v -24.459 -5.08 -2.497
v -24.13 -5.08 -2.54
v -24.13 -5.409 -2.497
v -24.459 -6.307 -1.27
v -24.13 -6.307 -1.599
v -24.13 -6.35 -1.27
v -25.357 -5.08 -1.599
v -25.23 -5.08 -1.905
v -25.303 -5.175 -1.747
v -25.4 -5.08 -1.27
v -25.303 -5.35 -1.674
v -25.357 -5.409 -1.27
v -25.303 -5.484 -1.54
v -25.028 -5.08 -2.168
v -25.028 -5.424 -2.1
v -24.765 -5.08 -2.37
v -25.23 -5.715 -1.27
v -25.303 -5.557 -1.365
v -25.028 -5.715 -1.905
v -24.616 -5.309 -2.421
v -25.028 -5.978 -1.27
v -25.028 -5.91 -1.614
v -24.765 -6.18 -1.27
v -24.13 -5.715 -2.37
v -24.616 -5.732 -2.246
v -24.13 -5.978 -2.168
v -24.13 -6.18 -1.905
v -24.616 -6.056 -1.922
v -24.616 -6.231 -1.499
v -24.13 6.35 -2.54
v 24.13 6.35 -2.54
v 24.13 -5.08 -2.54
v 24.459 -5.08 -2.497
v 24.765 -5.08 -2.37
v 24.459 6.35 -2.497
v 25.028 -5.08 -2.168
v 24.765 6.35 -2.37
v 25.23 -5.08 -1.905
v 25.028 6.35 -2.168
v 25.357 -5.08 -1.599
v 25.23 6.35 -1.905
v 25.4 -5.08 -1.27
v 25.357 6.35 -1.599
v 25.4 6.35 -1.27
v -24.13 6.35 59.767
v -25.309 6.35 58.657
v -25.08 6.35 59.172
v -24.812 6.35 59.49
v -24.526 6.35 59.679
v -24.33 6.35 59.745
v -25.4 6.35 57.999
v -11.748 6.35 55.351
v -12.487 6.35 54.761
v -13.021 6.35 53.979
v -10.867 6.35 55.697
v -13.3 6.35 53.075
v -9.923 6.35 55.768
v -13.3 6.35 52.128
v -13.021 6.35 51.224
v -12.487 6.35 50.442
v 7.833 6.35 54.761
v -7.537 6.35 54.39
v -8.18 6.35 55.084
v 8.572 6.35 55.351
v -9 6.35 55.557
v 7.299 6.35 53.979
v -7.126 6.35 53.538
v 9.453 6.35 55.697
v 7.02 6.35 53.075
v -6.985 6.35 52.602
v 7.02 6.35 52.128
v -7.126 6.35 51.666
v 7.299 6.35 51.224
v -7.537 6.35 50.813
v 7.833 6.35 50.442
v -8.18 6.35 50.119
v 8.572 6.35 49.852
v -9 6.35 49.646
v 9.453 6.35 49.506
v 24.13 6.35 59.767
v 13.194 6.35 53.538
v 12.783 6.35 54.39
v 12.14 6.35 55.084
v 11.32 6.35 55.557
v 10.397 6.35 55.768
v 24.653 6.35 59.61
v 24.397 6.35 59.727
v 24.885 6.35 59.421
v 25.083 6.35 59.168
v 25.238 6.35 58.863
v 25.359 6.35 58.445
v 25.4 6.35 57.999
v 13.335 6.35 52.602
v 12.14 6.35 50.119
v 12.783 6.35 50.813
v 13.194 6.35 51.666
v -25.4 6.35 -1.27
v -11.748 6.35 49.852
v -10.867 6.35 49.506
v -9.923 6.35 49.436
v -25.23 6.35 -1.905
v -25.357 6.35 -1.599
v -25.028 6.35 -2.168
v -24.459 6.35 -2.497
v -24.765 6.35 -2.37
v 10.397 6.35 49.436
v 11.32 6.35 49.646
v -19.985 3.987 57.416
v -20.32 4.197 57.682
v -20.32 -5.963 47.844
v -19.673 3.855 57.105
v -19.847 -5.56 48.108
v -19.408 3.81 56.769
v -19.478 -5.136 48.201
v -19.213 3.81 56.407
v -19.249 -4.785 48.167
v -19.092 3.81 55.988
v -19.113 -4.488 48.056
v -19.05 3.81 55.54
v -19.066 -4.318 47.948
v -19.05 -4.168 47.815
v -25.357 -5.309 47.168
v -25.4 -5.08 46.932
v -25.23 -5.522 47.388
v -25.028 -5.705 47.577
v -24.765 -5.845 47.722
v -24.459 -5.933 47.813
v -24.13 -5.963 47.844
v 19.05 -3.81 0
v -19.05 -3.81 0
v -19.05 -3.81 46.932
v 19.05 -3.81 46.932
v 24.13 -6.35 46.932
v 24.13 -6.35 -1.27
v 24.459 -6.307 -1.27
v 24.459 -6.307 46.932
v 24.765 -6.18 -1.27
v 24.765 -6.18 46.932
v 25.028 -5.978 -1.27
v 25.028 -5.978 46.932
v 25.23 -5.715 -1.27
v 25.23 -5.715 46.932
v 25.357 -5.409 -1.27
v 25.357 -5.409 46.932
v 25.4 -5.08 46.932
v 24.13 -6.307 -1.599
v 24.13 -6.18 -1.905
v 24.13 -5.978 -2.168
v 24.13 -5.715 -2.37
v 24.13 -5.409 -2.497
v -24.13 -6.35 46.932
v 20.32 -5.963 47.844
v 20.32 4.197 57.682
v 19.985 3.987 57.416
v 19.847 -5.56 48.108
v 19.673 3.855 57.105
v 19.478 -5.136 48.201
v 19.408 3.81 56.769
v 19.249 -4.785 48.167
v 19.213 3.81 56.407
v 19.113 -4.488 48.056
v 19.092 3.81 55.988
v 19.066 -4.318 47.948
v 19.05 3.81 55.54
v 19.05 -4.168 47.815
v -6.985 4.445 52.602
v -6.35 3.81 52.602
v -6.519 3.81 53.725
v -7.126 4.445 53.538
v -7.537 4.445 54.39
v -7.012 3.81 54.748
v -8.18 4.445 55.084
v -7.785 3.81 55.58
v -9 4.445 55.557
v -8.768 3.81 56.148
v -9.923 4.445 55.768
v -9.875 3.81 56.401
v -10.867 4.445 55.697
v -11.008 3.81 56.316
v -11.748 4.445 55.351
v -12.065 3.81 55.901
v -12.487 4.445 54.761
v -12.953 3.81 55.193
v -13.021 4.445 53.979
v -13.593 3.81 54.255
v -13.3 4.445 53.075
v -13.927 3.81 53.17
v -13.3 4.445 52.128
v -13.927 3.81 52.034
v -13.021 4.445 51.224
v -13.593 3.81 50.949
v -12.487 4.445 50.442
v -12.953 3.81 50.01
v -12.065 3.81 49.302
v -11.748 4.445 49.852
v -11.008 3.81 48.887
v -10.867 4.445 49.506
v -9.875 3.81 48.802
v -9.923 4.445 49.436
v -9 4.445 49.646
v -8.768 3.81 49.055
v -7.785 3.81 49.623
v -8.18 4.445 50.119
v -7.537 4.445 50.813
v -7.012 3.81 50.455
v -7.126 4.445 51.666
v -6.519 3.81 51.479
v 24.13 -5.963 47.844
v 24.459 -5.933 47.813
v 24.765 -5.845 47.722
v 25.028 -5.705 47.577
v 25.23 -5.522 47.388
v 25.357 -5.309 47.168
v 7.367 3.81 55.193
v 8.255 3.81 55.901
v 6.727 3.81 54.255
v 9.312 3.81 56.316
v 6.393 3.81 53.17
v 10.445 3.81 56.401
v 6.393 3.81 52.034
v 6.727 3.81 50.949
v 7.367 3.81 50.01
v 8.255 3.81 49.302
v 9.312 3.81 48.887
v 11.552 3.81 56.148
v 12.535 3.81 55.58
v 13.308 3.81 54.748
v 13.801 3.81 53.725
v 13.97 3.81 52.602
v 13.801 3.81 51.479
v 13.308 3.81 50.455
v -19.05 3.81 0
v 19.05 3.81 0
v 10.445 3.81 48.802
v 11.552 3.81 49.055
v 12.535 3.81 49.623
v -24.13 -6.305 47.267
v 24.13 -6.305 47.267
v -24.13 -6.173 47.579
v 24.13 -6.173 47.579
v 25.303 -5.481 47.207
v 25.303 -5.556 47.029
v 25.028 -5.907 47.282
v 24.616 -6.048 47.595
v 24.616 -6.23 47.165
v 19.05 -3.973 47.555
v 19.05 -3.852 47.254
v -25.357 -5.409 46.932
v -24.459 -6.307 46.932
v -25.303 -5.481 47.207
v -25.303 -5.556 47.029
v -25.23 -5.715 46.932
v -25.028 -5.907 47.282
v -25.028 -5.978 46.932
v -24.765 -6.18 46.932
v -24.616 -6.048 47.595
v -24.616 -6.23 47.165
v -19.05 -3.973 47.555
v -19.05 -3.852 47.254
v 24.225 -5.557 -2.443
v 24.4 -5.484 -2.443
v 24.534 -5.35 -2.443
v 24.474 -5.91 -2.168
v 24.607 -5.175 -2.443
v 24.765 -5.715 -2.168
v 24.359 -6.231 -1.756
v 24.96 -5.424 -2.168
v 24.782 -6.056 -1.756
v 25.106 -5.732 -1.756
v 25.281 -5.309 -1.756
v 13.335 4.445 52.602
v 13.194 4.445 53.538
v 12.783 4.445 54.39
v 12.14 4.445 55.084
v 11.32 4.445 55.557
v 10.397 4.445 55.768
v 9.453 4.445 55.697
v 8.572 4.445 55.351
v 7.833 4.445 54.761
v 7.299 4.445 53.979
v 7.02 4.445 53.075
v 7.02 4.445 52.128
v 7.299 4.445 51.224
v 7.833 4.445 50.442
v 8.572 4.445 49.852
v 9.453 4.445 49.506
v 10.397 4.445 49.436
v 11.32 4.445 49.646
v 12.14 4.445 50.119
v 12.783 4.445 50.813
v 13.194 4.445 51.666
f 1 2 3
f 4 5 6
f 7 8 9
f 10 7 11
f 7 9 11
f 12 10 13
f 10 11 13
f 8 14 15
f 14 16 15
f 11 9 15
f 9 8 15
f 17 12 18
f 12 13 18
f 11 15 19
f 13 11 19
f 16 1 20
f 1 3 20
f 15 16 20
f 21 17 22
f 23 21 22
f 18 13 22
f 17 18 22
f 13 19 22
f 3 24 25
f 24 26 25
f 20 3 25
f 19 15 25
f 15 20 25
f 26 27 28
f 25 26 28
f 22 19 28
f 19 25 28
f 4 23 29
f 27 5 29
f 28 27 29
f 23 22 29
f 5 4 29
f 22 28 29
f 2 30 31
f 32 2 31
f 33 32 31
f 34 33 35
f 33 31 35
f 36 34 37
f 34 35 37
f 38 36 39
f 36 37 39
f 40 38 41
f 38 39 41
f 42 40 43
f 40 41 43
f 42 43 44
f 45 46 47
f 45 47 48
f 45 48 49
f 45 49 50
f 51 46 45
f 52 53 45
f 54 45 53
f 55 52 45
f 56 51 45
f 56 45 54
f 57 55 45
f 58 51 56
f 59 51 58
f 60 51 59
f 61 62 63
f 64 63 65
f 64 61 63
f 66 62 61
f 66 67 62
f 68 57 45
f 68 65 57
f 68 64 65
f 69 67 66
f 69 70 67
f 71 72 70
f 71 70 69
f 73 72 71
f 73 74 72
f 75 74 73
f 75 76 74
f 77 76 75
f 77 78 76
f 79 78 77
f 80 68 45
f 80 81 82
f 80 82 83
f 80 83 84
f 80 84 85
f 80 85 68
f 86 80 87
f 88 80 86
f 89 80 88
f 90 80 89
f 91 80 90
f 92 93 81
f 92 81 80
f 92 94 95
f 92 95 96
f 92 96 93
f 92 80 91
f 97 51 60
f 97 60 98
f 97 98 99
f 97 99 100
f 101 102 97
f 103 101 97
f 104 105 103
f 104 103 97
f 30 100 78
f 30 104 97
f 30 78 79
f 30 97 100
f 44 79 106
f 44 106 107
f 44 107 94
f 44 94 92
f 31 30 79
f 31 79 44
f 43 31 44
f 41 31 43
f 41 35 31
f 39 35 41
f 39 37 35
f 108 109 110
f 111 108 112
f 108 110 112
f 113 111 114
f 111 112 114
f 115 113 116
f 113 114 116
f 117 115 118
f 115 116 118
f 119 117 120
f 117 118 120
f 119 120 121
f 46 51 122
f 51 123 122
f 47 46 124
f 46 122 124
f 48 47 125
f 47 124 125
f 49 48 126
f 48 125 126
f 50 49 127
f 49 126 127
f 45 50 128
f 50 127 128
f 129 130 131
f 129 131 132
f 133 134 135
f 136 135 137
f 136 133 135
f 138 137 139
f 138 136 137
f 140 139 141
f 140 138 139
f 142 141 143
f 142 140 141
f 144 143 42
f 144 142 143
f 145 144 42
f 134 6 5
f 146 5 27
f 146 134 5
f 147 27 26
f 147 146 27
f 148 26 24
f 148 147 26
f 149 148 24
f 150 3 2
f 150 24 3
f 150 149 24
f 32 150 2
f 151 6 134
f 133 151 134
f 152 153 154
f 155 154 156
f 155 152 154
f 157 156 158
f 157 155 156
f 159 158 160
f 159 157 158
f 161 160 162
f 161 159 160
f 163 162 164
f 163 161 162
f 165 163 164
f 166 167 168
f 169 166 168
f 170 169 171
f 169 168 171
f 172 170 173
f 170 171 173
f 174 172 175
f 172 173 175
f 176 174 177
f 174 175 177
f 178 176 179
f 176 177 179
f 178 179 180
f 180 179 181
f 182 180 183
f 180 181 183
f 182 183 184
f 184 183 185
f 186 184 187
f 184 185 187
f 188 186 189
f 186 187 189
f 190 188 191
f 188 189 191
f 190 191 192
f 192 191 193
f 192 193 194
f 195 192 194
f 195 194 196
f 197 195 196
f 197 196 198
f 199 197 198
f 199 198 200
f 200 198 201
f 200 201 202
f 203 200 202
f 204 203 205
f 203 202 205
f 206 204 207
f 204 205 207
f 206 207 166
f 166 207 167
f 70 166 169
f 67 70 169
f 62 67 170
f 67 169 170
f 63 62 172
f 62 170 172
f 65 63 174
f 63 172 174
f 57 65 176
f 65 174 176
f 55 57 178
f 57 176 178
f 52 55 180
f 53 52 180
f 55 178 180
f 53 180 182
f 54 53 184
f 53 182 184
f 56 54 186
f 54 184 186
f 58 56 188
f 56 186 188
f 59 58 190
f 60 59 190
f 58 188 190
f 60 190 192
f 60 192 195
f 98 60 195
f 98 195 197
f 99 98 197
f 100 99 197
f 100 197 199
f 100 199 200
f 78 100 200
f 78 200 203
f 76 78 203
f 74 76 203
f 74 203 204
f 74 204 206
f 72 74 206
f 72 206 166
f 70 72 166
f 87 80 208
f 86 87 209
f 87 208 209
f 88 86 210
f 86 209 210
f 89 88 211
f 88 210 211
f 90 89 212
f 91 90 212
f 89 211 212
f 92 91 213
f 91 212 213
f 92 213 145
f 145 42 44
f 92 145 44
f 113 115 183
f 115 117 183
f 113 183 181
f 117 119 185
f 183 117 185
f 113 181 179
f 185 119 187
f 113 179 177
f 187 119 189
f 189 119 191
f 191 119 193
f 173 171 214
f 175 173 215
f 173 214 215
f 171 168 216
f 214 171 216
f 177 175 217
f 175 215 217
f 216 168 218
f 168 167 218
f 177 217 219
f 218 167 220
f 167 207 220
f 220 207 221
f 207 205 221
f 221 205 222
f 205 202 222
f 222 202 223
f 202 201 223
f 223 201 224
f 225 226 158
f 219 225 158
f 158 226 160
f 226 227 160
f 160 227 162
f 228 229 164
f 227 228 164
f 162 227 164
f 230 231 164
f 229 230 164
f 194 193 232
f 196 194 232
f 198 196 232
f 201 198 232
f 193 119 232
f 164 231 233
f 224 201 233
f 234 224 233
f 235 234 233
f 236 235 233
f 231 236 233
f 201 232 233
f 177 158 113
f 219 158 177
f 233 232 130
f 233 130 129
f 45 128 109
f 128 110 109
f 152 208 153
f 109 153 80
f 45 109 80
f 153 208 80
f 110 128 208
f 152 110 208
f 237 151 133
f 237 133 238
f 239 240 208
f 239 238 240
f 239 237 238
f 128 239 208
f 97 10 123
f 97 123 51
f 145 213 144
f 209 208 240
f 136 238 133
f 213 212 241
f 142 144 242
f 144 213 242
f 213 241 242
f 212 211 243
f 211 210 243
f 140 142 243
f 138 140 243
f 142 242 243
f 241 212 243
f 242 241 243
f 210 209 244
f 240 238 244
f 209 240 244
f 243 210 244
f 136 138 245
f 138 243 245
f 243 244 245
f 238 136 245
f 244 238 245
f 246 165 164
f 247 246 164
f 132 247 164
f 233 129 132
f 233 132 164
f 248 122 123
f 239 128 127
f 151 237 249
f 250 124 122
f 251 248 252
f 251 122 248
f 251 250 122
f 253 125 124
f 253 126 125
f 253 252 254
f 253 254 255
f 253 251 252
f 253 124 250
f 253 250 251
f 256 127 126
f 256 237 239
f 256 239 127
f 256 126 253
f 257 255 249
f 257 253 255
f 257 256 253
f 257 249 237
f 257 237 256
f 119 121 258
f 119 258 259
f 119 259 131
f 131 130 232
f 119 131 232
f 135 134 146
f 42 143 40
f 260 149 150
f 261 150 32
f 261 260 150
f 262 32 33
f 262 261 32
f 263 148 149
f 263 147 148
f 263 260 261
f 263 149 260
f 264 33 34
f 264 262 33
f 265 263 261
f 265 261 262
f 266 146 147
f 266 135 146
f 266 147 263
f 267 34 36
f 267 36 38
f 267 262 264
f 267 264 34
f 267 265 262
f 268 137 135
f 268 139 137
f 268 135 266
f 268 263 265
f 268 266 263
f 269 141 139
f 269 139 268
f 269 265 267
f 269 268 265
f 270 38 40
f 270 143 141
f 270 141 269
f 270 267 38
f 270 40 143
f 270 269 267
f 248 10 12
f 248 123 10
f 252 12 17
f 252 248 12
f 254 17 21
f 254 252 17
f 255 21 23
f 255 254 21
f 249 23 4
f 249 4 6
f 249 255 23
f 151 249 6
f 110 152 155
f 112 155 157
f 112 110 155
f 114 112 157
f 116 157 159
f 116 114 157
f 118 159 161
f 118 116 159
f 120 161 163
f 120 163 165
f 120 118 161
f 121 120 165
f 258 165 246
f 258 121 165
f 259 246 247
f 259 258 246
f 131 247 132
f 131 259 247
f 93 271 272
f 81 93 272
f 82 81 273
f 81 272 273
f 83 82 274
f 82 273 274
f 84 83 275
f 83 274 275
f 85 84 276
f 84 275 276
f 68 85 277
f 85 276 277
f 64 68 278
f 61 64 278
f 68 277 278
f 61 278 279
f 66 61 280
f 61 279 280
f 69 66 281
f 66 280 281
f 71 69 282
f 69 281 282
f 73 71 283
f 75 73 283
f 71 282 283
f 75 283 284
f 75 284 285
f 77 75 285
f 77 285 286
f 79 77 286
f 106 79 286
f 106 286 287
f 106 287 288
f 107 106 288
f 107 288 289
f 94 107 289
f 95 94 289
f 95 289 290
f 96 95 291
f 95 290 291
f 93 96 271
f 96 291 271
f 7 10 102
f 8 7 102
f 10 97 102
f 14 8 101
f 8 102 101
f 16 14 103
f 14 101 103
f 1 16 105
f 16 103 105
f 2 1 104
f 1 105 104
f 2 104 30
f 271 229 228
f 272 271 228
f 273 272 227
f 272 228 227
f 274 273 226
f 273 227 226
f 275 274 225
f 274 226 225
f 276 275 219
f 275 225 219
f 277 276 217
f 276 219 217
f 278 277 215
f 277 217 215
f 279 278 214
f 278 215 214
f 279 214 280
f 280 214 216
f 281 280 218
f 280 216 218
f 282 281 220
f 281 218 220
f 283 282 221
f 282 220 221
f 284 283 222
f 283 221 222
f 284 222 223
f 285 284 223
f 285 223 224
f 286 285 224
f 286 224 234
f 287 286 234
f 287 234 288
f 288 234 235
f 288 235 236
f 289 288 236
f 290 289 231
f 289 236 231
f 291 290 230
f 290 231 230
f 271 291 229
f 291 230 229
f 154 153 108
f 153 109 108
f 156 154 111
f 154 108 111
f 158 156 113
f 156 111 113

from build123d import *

# Parameters (mm, degrees)
F0_W     = 50.8
F0_H     = 12.7
F0_W_2   = 38.1
F0_H_2   = 7.62
F1_DEPTH = 2.54
F2_DEPTH = 63.5
F4_DEPTH = 50.8
F5_R     = 1.26999
F6_R     = 3.175
F7_DEPTH = 12.7
F8_SIZE  = 0.635


# Not quite as in the source:
# - a fillet or chamfer is up to 0.001 mm smaller than in the source, because OpenCascade refuses the exact size


with BuildPart() as f1:
    # F0 (on Top) → F1 (new body)
    with BuildSketch(Plane.XY):
        Rectangle(F0_W, F0_H)
        Rectangle(F0_W_2, F0_H_2, mode=Mode.SUBTRACT)
        Rectangle(F0_W_2, F0_H_2)
    extrude(amount=-F1_DEPTH)

    # F0 (on Top) → F2 (join)
    with BuildSketch(Plane.XY):
        Rectangle(F0_W, F0_H)
        Rectangle(F0_W_2, F0_H_2, mode=Mode.SUBTRACT)
    extrude(amount=F2_DEPTH)

    # F3 (on Right) → F4 (cut, symmetric)
    with BuildSketch(Plane.YZ):
        Polygon((-17.6573935896, 70.3983381391), (-13.9353135601, 40.1254184544), (17.3301566392, 70.3983381391), align=None)
    extrude(amount=F4_DEPTH, both=True, mode=Mode.SUBTRACT)

    # F5 (radius 1.27 in the source; OpenCascade refuses exactly that, so slightly less here)
    f5_edges = [f1.edges().sort_by_distance(p)[0] for p in [
        (25.4, -6.35, 22.464965),
        (0, -6.35, -2.54),
        (25.4, 0, -2.54),
        (-25.4, 0, -2.54),
        (-25.4, -6.35, 22.464965),
        (0, -6.35, 47.469929),
        (0, -3.81, 49.929295),
        (19.05, 0, 53.618343),
        (0, 3.81, 57.307391),
        (-19.05, 0, 53.618343),
        (-25.4, 0, 53.618343),
        (25.4, 0, 53.618343),
    ]]
    fillet(f5_edges, radius=F5_R)

    # F6 (on Front) → F7 (cut, symmetric)
    with BuildSketch(Plane.XZ):
        with Locations((-10.16, 52.6016924392)):
            Circle(F6_R)
        with Locations((10.16, 52.6016924392)):
            Circle(F6_R)
    extrude(amount=F7_DEPTH, both=True, mode=Mode.SUBTRACT)

    # F8
    f8_edges = [f1.edges().sort_by_distance(p)[0] for p in [
        (-13.335, 3.81, 52.601692),
        (6.985, 3.81, 52.601692),
    ]]
    chamfer(f8_edges, length=F8_SIZE)


solid = f1.part
